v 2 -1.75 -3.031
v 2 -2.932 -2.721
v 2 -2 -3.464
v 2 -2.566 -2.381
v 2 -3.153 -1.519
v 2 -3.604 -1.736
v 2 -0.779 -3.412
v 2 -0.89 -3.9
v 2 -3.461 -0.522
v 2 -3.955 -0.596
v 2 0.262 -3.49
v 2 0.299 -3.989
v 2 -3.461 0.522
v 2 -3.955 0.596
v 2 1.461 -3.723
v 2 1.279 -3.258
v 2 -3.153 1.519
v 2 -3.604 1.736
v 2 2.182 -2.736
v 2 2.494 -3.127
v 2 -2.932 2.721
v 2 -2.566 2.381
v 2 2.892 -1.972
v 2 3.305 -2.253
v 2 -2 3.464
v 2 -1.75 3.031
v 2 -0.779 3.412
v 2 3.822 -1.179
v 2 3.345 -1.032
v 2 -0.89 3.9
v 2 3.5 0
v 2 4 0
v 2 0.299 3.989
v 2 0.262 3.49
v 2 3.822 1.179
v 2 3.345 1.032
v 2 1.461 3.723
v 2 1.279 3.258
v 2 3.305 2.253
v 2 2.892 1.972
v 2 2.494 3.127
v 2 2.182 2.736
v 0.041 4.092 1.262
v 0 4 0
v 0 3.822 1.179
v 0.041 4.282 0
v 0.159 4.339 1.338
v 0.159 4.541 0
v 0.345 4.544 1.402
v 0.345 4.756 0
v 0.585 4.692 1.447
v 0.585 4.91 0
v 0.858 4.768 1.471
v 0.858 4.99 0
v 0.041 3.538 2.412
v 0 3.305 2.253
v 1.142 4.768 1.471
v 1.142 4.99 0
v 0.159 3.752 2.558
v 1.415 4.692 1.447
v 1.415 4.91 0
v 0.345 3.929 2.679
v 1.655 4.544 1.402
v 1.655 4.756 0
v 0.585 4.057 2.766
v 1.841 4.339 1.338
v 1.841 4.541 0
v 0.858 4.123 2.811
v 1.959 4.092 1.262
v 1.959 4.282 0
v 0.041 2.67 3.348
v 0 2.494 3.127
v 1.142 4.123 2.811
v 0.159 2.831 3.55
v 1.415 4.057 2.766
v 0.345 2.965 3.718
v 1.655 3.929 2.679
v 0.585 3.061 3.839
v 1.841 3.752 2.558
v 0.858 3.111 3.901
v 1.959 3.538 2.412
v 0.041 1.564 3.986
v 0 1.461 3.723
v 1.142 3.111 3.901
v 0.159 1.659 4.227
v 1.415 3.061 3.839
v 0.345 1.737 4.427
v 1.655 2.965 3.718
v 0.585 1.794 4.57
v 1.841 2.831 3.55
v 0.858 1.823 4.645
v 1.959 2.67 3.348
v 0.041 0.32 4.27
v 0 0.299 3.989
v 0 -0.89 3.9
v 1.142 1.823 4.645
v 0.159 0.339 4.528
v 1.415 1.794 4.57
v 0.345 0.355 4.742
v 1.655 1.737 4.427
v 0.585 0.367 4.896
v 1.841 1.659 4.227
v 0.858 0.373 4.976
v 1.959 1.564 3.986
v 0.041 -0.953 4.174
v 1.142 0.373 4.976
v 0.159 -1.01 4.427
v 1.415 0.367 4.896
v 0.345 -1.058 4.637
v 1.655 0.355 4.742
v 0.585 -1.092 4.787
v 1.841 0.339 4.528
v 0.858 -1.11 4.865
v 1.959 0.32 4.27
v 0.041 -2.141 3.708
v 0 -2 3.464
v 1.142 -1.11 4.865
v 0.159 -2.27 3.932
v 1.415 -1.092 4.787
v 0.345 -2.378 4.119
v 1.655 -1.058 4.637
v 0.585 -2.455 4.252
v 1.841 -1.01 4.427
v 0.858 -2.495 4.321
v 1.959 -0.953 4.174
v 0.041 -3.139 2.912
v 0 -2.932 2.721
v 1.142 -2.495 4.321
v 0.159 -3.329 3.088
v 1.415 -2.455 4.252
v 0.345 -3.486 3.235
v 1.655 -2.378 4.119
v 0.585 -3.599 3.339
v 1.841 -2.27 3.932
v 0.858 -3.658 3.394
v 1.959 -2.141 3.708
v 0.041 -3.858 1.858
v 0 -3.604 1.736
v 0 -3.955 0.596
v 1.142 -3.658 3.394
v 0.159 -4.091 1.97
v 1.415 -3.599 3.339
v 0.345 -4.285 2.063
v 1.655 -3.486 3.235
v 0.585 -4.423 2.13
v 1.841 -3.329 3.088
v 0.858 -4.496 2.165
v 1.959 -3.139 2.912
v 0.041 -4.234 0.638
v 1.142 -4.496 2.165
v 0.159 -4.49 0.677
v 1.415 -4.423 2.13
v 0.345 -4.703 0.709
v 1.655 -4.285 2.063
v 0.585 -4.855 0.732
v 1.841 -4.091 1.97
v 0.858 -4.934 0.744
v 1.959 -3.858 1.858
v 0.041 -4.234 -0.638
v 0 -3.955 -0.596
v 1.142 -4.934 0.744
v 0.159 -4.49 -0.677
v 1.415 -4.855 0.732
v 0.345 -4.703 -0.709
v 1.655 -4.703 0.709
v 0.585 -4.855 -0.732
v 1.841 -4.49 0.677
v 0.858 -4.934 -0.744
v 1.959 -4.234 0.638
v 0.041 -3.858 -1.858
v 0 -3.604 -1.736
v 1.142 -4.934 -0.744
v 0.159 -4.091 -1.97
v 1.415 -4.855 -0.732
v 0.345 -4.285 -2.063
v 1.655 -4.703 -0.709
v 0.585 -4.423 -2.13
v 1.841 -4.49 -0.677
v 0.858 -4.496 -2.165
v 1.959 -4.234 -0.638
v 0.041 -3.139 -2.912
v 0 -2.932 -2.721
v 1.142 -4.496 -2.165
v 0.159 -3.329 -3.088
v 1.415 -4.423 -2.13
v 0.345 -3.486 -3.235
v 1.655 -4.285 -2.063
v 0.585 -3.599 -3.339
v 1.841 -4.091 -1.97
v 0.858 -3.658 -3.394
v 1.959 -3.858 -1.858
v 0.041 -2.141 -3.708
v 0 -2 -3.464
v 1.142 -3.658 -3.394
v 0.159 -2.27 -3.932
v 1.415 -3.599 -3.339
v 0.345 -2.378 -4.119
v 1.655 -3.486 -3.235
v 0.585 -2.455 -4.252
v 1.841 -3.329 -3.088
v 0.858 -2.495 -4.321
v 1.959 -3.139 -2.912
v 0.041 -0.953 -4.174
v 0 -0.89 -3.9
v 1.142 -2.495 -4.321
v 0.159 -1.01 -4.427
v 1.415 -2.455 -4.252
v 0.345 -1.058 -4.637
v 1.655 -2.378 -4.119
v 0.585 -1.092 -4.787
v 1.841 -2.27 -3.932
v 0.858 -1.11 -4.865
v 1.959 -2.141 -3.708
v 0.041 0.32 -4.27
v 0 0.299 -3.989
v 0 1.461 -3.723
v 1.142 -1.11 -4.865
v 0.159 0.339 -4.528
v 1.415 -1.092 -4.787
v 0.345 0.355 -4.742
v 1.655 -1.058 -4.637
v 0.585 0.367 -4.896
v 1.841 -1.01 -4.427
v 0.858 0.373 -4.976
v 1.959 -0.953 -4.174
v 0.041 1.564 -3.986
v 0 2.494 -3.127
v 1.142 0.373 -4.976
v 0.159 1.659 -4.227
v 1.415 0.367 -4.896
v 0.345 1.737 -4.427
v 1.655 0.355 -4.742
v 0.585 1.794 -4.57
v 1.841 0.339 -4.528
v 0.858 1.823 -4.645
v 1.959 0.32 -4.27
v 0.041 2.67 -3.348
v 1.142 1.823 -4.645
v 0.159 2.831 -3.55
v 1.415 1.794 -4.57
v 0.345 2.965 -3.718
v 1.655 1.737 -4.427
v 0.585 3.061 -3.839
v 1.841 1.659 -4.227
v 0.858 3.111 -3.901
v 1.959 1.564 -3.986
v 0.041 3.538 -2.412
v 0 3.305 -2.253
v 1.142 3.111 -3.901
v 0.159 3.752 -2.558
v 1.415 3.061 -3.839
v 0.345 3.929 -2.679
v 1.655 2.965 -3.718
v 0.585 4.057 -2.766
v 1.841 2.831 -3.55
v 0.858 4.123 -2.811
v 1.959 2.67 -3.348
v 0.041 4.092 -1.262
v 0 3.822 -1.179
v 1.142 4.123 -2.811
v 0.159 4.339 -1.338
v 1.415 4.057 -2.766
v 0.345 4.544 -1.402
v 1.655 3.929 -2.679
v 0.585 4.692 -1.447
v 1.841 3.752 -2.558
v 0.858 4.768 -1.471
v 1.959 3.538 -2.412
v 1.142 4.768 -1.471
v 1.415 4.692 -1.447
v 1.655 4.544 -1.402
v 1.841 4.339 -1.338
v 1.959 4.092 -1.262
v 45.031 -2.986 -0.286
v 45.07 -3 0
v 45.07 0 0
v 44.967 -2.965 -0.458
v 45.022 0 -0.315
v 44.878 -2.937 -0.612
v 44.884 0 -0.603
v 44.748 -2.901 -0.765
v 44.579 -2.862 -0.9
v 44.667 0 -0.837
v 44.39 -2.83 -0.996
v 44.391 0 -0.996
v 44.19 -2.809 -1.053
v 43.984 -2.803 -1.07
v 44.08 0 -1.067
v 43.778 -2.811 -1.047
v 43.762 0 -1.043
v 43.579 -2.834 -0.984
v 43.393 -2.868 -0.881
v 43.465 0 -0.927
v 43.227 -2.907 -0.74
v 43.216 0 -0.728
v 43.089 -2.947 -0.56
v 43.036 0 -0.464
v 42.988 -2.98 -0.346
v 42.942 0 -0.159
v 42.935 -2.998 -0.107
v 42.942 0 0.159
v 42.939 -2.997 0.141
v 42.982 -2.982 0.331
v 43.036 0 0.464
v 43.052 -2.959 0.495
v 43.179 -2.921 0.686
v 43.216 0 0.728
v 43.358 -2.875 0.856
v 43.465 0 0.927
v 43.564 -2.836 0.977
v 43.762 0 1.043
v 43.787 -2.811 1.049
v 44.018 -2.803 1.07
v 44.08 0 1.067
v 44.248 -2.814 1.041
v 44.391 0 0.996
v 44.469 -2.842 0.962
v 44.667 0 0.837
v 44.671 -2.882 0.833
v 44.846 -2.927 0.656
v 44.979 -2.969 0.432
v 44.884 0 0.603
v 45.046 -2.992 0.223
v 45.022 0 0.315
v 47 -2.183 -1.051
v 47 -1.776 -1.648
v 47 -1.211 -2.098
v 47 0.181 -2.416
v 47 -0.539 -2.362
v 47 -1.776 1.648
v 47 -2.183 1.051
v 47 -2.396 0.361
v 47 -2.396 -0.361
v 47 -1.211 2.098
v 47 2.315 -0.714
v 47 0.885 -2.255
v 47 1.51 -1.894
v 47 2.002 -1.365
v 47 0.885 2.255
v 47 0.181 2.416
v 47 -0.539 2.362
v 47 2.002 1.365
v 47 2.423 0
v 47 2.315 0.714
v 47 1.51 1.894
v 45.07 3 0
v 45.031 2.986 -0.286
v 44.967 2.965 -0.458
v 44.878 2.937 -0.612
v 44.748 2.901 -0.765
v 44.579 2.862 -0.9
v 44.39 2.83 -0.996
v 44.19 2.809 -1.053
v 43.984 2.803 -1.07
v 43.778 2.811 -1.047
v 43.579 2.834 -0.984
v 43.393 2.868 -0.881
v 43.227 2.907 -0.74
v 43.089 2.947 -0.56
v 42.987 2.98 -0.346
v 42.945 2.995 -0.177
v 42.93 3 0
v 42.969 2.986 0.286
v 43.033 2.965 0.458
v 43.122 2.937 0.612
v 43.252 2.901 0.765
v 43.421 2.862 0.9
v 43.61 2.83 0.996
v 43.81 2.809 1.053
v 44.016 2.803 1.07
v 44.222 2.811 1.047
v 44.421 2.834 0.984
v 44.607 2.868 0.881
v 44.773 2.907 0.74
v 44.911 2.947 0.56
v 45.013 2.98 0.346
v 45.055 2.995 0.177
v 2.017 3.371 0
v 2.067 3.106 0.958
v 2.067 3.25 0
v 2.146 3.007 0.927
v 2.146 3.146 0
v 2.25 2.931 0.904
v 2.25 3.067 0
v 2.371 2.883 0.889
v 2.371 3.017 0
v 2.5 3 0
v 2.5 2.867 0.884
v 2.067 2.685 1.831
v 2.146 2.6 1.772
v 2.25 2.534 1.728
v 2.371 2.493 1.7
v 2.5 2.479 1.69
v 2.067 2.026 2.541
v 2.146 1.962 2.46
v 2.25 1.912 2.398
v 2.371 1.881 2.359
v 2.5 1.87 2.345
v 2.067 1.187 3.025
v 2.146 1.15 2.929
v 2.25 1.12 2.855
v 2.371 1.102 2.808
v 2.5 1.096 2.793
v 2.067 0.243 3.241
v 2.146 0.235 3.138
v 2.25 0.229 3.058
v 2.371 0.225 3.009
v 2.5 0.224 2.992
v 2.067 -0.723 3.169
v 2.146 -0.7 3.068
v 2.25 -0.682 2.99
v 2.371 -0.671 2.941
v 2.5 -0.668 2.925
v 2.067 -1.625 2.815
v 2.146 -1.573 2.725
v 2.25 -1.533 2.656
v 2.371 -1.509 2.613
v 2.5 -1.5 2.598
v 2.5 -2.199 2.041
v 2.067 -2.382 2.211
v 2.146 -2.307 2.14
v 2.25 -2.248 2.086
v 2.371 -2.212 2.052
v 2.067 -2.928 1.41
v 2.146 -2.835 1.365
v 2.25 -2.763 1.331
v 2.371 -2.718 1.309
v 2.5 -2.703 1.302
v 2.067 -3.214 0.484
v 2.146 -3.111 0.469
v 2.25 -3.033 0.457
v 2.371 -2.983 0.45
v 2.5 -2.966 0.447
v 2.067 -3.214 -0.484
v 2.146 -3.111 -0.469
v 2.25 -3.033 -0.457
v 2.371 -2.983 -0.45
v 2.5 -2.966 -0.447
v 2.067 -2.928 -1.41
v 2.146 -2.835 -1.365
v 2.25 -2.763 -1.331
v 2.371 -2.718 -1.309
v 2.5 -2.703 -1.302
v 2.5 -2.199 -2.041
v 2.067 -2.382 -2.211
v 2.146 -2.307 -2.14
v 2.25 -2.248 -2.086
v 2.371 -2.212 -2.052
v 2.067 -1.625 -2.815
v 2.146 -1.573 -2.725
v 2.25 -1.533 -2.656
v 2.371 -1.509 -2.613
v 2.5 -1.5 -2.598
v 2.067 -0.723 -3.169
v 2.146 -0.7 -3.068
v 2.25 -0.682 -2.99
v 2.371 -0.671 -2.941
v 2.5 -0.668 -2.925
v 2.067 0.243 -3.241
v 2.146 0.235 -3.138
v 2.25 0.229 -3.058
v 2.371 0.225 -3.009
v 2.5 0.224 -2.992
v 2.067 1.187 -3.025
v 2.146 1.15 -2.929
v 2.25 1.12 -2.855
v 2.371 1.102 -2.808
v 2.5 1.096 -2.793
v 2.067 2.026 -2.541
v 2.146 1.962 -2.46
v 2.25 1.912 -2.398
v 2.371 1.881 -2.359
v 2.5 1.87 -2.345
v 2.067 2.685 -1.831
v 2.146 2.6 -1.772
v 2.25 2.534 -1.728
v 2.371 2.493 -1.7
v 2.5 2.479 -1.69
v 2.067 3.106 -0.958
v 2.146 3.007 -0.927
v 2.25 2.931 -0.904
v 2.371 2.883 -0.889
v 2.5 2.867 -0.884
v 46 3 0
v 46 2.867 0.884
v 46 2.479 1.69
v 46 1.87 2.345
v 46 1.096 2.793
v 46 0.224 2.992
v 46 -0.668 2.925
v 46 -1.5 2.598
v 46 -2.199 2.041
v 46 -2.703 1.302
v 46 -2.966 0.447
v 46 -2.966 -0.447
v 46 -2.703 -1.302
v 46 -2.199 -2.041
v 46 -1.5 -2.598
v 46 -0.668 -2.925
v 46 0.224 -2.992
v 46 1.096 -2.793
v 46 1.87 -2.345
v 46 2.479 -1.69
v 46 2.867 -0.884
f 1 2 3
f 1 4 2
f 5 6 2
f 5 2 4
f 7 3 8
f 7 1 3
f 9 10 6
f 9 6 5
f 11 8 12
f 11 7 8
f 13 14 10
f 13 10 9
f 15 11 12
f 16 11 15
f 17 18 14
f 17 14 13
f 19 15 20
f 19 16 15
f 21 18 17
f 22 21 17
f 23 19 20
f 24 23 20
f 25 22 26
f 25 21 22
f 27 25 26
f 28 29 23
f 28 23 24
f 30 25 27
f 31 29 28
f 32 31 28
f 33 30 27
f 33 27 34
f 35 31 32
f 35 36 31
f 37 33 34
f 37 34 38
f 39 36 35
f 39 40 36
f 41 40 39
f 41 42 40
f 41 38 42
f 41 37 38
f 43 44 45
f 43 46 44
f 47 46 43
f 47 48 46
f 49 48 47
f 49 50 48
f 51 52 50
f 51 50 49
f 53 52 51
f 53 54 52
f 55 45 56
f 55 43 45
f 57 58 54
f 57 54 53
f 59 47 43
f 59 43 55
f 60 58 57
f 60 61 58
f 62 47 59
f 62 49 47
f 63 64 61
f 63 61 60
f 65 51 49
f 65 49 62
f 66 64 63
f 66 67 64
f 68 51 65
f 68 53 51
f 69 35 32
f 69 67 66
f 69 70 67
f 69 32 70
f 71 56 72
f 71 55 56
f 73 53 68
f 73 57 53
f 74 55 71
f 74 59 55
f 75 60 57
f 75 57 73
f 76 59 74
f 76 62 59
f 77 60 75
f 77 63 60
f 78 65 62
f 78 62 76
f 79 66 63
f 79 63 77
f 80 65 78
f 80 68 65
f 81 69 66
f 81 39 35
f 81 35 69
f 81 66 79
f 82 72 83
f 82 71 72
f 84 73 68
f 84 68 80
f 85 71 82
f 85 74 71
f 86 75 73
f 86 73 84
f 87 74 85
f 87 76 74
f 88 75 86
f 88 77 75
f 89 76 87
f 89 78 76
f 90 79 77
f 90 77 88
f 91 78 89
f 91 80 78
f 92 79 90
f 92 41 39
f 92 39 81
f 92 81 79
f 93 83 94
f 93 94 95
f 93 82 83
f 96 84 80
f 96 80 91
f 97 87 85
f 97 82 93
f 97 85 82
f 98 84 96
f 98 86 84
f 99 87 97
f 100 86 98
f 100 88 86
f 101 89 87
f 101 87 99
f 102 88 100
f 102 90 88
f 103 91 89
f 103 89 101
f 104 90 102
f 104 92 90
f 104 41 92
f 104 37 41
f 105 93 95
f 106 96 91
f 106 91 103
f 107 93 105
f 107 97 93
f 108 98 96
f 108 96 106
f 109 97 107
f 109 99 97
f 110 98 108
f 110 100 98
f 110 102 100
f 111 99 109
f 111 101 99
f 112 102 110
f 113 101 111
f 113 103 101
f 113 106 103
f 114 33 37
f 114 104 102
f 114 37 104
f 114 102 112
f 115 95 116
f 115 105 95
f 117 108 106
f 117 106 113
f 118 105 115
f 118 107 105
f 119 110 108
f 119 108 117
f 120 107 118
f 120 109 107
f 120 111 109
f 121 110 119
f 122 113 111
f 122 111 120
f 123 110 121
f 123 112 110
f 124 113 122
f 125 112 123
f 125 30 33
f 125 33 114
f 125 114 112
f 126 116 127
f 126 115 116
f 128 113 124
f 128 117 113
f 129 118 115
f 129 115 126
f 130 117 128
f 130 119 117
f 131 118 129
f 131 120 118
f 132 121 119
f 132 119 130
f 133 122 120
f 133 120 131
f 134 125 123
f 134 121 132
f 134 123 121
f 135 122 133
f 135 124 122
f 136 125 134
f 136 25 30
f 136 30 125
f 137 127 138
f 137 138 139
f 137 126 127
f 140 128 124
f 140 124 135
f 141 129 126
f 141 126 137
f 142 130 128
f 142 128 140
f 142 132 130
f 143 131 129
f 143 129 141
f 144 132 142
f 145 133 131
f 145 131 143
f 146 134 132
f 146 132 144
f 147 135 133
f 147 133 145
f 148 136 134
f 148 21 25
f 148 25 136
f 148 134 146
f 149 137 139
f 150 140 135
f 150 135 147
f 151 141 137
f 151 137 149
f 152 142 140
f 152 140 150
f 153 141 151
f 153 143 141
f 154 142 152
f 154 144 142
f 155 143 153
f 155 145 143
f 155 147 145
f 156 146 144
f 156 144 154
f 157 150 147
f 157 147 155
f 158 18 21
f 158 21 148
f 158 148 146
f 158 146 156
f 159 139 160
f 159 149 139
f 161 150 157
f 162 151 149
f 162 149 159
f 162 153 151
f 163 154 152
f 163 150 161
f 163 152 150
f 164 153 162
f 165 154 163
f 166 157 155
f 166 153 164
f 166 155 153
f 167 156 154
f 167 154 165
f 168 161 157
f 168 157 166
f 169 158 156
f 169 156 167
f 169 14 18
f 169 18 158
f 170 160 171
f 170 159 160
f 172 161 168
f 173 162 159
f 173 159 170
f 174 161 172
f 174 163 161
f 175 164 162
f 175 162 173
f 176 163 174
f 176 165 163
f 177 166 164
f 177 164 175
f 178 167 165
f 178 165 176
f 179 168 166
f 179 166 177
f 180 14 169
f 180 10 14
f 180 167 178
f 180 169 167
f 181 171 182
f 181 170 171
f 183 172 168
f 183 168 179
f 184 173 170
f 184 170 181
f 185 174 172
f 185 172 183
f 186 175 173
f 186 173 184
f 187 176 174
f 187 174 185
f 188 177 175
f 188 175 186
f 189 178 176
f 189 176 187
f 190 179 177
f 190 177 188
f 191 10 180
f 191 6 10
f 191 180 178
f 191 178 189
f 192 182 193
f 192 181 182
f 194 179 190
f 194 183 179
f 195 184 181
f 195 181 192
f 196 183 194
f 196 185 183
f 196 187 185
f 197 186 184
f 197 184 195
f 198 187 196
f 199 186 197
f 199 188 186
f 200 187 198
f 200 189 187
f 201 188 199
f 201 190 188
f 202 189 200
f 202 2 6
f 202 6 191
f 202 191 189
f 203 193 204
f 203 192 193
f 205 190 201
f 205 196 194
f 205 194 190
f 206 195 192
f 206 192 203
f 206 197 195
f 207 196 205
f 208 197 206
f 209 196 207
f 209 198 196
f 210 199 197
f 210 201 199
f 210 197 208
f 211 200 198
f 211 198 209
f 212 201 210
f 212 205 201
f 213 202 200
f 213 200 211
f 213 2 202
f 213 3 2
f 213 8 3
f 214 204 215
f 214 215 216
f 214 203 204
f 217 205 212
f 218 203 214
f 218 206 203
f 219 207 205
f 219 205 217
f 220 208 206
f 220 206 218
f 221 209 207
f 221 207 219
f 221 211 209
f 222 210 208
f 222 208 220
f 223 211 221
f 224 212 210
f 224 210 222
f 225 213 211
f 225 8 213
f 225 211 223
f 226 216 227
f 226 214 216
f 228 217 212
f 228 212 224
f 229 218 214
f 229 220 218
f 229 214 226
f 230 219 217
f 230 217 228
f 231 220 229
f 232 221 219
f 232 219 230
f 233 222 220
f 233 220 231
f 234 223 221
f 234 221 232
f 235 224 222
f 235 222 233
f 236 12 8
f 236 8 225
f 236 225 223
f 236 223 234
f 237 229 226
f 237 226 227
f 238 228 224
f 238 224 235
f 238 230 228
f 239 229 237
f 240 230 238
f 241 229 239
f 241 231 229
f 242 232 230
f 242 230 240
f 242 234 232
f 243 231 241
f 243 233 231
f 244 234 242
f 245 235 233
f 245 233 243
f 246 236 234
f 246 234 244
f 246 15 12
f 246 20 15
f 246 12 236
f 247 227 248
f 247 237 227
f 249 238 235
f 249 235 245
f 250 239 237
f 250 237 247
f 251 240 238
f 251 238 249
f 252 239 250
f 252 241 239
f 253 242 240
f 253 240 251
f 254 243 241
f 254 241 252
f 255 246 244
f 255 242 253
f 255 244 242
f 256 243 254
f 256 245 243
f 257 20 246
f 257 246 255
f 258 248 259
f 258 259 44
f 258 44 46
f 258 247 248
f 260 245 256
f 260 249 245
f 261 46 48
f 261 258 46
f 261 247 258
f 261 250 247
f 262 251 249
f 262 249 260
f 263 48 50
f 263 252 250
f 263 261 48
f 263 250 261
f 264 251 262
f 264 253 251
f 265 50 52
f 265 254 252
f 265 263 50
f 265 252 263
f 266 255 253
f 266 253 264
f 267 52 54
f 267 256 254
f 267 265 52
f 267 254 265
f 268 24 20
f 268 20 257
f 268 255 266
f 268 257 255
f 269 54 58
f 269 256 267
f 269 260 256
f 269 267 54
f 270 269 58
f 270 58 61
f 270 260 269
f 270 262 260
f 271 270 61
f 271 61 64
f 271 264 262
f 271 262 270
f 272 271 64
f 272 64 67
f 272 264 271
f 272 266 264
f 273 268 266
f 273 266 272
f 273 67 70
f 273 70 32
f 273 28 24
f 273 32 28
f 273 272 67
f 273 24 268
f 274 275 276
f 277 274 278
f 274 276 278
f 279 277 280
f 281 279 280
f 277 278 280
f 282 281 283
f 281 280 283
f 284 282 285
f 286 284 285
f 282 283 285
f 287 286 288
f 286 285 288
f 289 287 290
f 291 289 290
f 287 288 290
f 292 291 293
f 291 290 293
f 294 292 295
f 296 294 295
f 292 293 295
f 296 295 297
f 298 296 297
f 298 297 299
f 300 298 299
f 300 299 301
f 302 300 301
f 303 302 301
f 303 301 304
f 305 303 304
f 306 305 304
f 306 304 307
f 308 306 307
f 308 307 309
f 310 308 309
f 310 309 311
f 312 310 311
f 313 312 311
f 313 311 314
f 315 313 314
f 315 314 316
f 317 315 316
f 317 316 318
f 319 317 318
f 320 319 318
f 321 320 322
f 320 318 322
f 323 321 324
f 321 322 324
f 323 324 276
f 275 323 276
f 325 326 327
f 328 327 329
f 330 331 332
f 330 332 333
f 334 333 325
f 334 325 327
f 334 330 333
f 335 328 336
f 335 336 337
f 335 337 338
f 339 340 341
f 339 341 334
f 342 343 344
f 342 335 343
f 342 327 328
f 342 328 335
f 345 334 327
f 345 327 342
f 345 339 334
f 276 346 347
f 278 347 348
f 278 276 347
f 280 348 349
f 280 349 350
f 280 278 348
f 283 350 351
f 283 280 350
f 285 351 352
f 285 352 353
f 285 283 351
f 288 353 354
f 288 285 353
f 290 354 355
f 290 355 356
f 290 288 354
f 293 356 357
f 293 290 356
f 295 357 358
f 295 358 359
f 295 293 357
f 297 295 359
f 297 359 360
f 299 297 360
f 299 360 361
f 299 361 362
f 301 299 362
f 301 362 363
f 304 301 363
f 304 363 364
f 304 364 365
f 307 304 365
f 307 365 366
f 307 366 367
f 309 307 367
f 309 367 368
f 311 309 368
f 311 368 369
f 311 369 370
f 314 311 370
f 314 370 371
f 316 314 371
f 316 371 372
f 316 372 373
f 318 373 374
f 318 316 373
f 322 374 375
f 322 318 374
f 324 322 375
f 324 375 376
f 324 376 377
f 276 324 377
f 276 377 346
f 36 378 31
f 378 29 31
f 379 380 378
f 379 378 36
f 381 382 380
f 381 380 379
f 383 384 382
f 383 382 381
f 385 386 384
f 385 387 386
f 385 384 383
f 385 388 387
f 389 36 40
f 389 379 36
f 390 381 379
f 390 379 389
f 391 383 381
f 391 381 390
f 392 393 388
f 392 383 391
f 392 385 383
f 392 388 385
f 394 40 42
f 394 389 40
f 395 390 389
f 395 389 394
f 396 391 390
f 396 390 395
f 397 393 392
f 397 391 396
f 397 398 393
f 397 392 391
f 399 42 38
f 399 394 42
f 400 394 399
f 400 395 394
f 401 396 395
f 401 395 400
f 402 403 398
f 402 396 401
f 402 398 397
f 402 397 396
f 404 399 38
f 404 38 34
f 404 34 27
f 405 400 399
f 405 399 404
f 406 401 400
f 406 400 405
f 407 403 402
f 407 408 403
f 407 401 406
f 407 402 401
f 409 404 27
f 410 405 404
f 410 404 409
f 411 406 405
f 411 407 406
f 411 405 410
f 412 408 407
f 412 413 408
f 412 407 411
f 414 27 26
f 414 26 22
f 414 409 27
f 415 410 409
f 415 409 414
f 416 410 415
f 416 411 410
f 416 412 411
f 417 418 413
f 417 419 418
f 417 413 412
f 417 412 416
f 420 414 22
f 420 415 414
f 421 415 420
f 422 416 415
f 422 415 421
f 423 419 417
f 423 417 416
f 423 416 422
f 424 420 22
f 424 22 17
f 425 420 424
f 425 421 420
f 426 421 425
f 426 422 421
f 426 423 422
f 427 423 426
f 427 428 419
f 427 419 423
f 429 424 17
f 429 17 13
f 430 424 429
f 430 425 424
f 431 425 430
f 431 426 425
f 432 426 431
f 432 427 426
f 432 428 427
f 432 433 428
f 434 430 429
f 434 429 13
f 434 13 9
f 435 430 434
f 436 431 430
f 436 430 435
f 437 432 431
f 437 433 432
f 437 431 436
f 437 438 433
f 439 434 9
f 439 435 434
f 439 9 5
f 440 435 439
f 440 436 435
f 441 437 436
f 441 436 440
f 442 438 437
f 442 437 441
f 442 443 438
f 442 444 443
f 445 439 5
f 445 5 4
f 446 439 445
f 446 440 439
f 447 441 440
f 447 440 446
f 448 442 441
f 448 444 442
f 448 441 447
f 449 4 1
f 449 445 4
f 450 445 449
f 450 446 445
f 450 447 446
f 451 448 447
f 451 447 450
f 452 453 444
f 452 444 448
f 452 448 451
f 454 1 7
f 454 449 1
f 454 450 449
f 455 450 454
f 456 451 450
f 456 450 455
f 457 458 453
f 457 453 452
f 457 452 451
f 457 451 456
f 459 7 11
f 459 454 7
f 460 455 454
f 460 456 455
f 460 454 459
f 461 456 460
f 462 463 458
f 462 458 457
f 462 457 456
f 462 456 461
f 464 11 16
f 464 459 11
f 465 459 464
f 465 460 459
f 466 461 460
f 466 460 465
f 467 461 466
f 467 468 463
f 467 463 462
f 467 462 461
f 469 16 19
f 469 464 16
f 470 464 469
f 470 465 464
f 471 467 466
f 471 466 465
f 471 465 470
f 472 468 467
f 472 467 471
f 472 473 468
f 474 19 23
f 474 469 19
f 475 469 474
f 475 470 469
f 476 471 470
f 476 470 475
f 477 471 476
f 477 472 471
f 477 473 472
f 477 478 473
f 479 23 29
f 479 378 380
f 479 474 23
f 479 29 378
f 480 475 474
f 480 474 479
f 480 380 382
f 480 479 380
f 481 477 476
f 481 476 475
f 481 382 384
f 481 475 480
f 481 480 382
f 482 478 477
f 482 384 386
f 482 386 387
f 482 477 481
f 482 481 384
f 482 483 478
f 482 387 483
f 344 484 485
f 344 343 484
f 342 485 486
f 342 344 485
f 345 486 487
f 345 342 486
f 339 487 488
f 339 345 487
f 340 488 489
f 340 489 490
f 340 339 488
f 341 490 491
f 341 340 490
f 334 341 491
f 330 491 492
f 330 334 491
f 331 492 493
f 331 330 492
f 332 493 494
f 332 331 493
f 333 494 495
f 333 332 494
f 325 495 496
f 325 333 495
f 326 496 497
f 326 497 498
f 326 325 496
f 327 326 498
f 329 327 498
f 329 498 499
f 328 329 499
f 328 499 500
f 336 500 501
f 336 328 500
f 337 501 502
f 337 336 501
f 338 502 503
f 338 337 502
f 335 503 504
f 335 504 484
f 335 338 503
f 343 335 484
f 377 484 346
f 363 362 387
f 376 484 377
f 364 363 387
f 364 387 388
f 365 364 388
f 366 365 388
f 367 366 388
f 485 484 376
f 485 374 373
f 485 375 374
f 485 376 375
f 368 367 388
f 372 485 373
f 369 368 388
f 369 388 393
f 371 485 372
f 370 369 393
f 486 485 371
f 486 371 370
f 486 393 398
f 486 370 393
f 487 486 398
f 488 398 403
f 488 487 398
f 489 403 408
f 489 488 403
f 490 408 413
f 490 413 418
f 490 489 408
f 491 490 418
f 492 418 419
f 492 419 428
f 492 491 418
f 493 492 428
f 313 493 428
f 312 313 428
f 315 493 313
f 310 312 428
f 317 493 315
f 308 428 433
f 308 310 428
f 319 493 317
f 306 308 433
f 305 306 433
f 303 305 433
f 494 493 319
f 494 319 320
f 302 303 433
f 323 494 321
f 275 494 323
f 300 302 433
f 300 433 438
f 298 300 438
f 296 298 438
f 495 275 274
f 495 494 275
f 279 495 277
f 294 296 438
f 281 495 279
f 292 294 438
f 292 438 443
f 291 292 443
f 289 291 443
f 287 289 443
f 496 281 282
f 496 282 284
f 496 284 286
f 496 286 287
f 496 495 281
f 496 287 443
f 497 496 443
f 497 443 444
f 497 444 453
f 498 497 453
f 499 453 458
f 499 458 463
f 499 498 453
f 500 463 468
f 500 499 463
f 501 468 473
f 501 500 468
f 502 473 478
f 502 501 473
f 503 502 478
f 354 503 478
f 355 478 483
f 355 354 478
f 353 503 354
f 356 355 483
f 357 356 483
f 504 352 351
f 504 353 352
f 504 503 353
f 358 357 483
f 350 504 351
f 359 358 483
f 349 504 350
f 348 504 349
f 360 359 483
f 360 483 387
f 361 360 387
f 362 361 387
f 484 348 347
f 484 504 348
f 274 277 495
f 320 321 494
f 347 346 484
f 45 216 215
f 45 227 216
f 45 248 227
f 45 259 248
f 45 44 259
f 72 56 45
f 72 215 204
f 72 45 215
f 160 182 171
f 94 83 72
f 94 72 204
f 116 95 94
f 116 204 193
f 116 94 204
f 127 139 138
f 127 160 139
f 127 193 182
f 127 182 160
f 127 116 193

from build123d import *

# Parameters (mm, degrees)
CHAMFER1_R      = 0.5
SKETCH2_R       = 1.07
HOLE_DEPTH      = 6
HOLE_DEPTH_BACK = 6.0000001


with BuildPart() as part:
    # Sketch1 → BaseBody (revolve)
    with BuildSketch(Plane.XY):
        with BuildLine():
            Line((47, 0), (0, 0))
            Line((0, 0), (0, 4))
            ThreePointArc((0, 4), (1, 5), (2, 4))
            Line((2, 4), (2, 3))
            Line((2, 3), (46, 3))
            Line((46, 3), (47, 2.422649731))
            Line((47, 2.422649731), (47, 0))
        make_face()
    revolve(axis=Axis((-19.830028721, 0, 0), (1, 0, 0)))

    # Chamfer1
    chamfer1_edges = [part.edges().sort_by_distance(p)[0] for p in [
        (2, -3, 0),
    ]]
    fillet(chamfer1_edges, radius=CHAMFER1_R)

    # Sketch2 → Hole (cut, two sides)
    with BuildSketch(Plane(origin=(0, 0, 0), x_dir=(1, 0, 0), z_dir=(0, 1, 0))) as hole_sk:
        with Locations((44, 0)):
            Circle(SKETCH2_R)
    extrude(amount=HOLE_DEPTH, mode=Mode.SUBTRACT)
    extrude(hole_sk.sketch, amount=-HOLE_DEPTH_BACK, mode=Mode.SUBTRACT)


solid = part.part
